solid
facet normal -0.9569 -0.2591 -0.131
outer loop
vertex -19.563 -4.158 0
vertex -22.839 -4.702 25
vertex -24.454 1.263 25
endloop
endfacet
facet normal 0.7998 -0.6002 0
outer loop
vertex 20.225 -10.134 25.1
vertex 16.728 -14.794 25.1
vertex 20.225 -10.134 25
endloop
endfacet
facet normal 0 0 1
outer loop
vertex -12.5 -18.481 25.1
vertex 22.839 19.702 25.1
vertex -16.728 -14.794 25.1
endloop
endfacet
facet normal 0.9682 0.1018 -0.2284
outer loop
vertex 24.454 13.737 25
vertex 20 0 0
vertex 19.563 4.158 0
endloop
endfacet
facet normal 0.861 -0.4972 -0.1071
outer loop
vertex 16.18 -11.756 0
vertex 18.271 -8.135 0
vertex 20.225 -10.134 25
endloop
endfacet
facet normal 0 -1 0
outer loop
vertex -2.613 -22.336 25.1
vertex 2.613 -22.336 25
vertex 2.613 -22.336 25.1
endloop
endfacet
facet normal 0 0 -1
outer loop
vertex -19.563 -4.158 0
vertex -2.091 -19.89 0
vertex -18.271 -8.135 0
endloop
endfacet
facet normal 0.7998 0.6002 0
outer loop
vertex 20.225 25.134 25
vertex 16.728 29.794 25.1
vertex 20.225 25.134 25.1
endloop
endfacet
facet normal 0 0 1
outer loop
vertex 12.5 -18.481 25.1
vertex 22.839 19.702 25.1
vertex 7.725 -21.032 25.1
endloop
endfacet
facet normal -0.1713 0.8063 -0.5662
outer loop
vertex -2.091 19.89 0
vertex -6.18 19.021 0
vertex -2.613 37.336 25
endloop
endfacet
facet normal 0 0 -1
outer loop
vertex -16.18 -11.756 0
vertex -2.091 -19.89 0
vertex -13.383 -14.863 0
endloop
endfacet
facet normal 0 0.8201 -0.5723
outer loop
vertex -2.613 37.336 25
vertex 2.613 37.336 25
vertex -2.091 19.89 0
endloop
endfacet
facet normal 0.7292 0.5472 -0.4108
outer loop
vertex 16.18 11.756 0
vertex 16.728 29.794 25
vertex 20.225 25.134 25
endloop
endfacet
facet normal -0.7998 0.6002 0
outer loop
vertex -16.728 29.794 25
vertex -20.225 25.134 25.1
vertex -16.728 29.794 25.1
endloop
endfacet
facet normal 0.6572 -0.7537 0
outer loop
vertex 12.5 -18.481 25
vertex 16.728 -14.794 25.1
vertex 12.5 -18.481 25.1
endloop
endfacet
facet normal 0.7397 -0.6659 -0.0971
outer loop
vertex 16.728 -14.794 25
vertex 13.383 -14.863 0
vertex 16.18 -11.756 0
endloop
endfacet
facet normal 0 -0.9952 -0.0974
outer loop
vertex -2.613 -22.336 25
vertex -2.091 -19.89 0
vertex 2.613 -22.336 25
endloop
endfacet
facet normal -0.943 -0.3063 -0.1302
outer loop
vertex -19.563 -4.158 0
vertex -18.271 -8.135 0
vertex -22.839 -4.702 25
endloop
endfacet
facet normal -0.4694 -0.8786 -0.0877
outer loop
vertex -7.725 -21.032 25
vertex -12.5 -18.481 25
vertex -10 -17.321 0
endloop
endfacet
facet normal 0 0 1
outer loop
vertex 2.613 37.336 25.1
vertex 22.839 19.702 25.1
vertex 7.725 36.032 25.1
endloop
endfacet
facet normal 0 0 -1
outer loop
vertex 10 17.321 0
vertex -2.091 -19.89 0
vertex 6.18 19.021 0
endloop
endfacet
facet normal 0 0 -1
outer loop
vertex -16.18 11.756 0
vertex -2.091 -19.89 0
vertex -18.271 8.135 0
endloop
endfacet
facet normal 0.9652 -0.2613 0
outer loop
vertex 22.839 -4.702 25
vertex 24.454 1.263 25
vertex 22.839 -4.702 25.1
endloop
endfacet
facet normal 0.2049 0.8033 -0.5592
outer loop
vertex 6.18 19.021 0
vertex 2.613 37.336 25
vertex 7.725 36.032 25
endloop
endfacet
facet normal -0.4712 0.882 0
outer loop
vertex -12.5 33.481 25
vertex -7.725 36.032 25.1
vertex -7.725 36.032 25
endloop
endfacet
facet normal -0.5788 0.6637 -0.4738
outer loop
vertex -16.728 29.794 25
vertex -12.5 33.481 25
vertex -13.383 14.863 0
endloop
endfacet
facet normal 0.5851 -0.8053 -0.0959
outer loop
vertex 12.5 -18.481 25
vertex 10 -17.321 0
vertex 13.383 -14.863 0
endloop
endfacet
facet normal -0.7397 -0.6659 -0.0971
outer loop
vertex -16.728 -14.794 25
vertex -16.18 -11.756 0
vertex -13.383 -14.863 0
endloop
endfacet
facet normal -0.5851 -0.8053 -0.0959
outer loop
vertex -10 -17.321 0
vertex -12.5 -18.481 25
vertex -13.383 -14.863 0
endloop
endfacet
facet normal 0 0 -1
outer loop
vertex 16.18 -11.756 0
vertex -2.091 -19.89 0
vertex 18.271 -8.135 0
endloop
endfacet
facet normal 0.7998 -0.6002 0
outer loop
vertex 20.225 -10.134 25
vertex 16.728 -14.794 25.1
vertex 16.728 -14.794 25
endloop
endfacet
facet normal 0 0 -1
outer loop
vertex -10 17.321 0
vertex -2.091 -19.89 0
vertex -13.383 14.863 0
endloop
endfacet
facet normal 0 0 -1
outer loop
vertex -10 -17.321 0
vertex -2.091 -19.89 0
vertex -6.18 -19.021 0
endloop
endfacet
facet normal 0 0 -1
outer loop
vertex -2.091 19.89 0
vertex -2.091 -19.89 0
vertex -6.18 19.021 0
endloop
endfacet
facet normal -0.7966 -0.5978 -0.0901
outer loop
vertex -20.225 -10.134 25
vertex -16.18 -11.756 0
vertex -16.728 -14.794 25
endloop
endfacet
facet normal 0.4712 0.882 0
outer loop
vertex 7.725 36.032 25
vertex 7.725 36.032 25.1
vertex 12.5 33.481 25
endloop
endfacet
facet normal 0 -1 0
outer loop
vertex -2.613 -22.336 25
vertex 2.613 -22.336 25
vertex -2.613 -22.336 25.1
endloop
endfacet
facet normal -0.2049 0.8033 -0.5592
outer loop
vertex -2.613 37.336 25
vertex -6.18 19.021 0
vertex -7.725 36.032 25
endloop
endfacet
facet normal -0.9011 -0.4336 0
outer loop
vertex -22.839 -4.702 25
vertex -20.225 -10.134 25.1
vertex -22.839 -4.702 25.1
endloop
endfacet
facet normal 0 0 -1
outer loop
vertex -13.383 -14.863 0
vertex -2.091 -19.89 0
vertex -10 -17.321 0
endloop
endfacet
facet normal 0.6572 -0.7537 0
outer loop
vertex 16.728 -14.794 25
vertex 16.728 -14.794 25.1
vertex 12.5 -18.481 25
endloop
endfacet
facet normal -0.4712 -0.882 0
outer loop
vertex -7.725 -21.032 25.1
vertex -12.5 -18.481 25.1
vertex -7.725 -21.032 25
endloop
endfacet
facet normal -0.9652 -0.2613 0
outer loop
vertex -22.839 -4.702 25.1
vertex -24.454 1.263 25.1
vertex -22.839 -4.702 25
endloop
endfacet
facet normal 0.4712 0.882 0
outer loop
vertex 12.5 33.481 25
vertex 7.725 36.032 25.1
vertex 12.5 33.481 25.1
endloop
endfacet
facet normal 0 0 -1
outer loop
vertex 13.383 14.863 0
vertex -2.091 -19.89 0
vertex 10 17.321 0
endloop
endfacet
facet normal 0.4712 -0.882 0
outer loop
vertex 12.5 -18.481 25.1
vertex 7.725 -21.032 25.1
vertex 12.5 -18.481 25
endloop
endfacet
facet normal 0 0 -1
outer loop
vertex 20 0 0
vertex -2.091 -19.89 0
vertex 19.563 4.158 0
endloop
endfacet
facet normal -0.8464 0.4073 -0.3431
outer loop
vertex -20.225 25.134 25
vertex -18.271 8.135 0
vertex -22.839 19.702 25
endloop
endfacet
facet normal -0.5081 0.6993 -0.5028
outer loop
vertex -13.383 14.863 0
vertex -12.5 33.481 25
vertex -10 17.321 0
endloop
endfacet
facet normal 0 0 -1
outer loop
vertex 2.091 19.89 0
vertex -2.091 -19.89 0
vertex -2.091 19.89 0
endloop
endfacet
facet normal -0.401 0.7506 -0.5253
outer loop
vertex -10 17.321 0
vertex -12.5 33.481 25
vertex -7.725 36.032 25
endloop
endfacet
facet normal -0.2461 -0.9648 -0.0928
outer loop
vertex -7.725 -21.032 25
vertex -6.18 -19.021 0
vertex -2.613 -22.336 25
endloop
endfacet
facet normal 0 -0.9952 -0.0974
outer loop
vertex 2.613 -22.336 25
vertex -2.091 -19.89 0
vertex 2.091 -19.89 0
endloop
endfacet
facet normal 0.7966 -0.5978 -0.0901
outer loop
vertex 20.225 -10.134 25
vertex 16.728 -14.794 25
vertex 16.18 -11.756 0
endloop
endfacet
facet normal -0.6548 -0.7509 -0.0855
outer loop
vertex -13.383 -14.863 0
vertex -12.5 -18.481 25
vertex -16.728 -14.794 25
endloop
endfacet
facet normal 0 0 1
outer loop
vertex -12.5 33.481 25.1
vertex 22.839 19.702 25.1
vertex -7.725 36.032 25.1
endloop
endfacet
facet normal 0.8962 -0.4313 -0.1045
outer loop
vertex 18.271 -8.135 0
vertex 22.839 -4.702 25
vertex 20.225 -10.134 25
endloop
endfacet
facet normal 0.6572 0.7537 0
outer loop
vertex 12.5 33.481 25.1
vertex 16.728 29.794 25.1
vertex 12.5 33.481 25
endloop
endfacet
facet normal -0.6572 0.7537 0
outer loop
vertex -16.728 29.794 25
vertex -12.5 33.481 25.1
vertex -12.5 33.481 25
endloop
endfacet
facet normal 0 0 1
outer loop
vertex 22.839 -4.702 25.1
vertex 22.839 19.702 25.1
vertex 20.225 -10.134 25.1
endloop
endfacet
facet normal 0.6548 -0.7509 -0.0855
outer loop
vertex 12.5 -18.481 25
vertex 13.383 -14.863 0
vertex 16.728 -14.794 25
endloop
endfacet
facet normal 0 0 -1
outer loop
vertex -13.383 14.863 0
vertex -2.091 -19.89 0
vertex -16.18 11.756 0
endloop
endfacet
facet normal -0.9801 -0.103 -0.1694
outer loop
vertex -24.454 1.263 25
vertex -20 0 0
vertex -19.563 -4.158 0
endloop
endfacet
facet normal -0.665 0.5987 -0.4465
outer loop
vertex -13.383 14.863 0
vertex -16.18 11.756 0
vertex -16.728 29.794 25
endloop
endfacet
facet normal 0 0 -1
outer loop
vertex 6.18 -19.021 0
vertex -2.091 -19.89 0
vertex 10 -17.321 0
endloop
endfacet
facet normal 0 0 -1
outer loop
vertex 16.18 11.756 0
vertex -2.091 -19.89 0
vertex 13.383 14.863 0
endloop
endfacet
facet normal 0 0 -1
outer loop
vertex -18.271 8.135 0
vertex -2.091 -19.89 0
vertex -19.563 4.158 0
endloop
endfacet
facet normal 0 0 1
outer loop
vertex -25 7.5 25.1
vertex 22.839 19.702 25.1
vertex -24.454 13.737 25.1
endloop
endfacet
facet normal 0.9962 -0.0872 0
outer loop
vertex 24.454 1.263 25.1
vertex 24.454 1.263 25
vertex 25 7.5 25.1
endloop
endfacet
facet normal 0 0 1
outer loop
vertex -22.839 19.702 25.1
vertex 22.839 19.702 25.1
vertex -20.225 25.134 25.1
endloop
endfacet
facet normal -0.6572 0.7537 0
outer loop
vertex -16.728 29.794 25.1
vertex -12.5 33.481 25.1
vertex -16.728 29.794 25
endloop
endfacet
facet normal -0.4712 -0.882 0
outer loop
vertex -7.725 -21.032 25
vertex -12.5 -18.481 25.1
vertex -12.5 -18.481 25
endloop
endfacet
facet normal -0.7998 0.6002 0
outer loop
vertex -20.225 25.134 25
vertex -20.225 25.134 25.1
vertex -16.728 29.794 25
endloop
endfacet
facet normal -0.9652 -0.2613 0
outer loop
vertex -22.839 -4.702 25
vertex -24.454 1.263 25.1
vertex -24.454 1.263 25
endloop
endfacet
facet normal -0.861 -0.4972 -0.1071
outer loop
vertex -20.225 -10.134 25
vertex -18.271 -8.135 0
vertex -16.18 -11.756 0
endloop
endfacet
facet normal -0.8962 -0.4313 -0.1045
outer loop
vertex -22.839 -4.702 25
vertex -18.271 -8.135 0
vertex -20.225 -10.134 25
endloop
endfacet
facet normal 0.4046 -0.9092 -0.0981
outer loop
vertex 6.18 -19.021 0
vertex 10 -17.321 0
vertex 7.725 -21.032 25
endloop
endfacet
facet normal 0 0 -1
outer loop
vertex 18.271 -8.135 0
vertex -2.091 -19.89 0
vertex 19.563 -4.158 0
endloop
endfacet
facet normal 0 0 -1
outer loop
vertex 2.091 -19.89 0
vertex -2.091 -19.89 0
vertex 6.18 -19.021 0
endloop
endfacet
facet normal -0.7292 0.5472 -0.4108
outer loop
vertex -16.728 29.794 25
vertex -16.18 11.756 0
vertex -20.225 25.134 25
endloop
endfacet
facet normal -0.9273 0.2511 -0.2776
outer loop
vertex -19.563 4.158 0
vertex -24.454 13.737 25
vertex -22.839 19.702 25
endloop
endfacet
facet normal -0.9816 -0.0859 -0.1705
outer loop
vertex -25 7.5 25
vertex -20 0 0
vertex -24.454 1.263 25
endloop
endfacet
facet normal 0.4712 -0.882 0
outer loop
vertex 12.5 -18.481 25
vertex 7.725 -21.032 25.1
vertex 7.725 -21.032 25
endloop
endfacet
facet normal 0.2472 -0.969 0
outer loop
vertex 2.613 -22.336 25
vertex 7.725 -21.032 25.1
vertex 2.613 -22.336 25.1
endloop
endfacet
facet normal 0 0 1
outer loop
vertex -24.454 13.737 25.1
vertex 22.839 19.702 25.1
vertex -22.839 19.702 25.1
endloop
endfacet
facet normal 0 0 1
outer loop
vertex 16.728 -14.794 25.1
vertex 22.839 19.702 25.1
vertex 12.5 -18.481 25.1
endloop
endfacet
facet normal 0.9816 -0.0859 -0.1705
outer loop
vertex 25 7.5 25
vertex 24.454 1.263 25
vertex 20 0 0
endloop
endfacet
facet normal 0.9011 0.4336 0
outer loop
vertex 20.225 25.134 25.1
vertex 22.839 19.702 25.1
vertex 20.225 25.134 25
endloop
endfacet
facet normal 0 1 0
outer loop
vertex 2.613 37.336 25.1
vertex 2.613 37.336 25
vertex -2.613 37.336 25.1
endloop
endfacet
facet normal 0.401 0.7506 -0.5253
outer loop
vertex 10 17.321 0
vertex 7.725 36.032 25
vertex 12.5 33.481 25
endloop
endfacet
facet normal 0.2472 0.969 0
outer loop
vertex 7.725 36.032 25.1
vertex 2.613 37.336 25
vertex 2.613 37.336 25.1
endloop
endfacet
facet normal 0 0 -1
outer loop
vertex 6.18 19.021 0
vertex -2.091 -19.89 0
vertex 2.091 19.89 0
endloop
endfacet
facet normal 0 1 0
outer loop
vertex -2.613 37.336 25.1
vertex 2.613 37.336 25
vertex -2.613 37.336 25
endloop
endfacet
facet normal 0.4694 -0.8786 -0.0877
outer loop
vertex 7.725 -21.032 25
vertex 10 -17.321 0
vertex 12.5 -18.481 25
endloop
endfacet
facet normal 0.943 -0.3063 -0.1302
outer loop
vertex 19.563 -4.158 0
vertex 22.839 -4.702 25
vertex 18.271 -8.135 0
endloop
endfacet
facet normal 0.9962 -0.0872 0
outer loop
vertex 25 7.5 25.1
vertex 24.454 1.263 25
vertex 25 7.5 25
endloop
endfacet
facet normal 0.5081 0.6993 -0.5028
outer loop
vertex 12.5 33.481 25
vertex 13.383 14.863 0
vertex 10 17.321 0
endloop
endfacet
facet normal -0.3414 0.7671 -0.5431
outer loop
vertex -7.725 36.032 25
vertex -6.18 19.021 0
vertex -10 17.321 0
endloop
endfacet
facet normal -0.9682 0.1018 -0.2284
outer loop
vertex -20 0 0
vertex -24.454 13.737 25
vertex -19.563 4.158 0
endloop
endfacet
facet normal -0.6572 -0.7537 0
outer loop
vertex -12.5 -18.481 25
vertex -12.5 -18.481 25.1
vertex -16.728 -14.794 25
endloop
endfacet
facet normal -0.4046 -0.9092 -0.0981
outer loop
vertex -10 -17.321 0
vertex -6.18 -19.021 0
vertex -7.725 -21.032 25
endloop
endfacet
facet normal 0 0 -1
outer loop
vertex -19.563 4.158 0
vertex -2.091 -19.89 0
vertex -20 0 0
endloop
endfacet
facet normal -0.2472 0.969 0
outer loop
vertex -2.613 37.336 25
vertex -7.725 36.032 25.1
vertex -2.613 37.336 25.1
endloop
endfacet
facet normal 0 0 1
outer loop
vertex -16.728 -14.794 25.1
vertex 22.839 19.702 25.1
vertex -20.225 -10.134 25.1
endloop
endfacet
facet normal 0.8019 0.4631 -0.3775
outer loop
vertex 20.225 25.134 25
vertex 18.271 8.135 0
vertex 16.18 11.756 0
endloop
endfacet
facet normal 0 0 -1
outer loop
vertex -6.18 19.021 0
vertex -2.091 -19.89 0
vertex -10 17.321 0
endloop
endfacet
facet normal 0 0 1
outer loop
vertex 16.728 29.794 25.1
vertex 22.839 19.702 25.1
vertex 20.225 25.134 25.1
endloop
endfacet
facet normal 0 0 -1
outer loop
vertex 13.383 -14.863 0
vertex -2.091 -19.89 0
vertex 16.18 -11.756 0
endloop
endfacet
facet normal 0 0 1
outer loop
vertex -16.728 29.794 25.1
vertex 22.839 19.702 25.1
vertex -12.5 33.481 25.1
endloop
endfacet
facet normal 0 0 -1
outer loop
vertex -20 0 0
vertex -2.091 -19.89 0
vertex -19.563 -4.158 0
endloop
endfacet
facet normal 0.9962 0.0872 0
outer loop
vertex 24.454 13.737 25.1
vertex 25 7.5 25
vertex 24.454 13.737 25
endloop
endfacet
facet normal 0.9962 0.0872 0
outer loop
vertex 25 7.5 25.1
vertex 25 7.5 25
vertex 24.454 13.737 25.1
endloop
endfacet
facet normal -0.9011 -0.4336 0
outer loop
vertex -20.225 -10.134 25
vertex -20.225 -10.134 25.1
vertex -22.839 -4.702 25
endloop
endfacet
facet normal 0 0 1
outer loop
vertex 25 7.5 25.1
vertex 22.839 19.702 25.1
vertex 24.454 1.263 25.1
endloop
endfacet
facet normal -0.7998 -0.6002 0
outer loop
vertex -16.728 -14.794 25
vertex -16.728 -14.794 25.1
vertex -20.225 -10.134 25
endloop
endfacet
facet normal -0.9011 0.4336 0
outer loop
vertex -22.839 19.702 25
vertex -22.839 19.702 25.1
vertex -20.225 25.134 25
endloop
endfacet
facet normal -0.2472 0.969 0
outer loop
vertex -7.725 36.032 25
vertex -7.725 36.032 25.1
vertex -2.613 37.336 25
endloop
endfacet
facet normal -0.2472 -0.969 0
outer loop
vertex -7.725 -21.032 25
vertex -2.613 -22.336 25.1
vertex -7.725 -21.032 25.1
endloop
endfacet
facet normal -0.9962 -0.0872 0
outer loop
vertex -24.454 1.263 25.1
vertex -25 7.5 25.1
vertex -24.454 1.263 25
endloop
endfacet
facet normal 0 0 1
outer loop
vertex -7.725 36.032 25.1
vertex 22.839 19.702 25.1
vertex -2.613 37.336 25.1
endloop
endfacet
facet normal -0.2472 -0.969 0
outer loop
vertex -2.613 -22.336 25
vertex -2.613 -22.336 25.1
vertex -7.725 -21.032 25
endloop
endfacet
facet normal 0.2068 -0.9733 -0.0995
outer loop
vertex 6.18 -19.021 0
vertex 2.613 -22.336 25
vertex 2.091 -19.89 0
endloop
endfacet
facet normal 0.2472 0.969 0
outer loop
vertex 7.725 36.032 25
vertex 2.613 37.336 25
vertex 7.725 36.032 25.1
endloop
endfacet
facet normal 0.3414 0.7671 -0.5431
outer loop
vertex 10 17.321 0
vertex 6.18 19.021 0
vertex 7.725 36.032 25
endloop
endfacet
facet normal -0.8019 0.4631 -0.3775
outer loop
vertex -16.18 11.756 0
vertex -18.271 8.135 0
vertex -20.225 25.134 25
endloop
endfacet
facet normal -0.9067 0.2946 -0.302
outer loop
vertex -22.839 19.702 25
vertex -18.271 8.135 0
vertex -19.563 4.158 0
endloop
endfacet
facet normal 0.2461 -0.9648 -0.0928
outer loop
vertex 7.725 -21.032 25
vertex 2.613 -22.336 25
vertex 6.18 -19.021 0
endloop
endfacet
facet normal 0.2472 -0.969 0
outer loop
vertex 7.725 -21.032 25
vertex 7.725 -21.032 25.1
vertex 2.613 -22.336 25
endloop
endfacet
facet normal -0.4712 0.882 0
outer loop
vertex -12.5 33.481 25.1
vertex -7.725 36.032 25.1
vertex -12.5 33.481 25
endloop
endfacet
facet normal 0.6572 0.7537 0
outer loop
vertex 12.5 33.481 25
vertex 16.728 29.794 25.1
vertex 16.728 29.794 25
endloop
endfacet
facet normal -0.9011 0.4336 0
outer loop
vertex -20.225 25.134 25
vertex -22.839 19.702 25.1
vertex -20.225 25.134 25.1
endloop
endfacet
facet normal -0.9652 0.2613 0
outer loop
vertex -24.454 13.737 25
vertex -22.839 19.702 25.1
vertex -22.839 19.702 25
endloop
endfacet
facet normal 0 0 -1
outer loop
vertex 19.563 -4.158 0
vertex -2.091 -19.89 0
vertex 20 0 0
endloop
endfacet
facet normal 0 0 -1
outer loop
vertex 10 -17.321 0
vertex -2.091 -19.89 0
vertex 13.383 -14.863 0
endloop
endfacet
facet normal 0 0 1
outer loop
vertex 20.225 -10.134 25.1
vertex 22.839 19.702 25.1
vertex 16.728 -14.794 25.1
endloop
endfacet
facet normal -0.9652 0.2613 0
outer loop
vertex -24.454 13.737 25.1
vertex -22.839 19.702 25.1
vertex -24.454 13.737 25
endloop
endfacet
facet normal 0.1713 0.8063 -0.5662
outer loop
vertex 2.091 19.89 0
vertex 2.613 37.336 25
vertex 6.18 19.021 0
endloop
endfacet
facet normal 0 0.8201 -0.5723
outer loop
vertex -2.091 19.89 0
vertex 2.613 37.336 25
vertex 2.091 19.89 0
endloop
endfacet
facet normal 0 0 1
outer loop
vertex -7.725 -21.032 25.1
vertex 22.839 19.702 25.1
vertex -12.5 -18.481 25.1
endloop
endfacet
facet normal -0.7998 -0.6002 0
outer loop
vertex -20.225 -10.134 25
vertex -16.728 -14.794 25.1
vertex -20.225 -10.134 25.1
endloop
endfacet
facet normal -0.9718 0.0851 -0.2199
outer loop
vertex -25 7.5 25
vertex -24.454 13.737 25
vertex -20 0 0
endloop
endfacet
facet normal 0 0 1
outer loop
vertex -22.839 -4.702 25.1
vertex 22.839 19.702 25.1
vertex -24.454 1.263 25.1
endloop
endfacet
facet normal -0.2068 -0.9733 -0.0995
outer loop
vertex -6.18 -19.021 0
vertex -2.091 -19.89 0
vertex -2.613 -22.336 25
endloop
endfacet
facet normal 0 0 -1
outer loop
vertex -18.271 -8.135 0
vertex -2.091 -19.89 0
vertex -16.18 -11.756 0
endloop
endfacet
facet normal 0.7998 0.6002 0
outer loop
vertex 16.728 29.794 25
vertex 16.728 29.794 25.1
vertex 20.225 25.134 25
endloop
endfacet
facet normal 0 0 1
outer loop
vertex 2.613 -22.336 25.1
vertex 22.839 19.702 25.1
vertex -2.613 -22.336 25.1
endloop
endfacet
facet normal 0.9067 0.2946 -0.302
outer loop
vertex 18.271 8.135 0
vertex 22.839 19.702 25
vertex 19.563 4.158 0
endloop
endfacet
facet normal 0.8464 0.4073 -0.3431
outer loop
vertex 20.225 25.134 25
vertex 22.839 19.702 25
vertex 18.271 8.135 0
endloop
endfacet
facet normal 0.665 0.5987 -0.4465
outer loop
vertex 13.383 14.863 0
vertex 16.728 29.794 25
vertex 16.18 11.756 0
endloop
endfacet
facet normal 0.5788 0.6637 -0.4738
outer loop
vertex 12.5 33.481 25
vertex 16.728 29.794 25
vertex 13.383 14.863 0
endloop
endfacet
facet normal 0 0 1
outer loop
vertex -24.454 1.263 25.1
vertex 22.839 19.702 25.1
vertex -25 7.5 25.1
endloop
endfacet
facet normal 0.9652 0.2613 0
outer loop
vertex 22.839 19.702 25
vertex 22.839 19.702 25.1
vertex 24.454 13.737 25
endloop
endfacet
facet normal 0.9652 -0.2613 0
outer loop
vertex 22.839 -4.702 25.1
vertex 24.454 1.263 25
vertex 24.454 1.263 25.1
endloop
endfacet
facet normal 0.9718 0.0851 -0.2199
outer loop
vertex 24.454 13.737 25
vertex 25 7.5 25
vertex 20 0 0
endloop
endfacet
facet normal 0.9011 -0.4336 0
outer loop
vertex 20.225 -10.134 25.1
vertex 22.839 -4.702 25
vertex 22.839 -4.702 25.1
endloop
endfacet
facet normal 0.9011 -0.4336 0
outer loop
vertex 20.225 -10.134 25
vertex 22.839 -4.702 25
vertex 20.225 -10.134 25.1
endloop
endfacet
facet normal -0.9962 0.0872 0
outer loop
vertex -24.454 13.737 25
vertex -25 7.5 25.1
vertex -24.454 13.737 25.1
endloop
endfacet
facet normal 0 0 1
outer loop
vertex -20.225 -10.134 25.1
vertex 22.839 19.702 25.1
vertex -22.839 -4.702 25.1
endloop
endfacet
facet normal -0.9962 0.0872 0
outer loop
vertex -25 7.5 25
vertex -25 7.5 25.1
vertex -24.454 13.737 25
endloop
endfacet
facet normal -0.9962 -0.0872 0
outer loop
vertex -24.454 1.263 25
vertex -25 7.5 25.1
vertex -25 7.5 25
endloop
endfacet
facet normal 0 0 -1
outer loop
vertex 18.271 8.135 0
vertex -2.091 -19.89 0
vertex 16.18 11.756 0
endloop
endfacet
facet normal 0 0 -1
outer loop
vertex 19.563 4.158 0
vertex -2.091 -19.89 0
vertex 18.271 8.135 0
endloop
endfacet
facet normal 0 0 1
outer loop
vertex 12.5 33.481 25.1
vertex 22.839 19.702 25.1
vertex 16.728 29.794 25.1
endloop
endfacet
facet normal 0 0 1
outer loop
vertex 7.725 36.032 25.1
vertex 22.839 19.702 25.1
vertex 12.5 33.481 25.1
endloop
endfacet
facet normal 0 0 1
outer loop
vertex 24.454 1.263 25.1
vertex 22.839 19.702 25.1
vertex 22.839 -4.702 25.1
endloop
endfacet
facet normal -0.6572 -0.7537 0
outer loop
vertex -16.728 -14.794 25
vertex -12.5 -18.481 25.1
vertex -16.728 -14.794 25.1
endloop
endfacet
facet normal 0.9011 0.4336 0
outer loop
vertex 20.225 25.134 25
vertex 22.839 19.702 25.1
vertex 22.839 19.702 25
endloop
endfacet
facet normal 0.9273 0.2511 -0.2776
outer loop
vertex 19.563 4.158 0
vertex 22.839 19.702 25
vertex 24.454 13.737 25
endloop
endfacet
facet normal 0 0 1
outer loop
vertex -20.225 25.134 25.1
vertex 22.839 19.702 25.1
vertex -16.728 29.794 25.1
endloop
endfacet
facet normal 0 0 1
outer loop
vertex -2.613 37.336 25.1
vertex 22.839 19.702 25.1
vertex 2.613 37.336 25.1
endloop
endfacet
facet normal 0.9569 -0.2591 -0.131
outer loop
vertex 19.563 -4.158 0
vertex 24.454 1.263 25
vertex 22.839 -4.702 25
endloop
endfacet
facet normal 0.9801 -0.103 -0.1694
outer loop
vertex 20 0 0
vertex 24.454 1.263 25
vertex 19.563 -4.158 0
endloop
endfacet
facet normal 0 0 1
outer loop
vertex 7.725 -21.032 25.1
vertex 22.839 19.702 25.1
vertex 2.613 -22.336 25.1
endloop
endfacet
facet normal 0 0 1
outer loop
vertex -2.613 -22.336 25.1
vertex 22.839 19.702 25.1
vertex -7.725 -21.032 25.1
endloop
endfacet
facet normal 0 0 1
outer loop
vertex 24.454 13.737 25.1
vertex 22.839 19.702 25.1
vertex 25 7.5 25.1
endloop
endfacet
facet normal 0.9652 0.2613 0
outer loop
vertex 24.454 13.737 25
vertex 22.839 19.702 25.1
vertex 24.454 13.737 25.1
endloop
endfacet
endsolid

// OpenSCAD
$fn=30;

module cut_cone(radius1, radius2, height)
{
    hull()
    {
        cylinder(r=radius1, h=0.1);
        translate([0,0.3,1] * height)
        scale([1, 1.2, 1])
        cylinder(r=radius2, h=0.1);
    };
}

cut_cone(20, 25, 25);
